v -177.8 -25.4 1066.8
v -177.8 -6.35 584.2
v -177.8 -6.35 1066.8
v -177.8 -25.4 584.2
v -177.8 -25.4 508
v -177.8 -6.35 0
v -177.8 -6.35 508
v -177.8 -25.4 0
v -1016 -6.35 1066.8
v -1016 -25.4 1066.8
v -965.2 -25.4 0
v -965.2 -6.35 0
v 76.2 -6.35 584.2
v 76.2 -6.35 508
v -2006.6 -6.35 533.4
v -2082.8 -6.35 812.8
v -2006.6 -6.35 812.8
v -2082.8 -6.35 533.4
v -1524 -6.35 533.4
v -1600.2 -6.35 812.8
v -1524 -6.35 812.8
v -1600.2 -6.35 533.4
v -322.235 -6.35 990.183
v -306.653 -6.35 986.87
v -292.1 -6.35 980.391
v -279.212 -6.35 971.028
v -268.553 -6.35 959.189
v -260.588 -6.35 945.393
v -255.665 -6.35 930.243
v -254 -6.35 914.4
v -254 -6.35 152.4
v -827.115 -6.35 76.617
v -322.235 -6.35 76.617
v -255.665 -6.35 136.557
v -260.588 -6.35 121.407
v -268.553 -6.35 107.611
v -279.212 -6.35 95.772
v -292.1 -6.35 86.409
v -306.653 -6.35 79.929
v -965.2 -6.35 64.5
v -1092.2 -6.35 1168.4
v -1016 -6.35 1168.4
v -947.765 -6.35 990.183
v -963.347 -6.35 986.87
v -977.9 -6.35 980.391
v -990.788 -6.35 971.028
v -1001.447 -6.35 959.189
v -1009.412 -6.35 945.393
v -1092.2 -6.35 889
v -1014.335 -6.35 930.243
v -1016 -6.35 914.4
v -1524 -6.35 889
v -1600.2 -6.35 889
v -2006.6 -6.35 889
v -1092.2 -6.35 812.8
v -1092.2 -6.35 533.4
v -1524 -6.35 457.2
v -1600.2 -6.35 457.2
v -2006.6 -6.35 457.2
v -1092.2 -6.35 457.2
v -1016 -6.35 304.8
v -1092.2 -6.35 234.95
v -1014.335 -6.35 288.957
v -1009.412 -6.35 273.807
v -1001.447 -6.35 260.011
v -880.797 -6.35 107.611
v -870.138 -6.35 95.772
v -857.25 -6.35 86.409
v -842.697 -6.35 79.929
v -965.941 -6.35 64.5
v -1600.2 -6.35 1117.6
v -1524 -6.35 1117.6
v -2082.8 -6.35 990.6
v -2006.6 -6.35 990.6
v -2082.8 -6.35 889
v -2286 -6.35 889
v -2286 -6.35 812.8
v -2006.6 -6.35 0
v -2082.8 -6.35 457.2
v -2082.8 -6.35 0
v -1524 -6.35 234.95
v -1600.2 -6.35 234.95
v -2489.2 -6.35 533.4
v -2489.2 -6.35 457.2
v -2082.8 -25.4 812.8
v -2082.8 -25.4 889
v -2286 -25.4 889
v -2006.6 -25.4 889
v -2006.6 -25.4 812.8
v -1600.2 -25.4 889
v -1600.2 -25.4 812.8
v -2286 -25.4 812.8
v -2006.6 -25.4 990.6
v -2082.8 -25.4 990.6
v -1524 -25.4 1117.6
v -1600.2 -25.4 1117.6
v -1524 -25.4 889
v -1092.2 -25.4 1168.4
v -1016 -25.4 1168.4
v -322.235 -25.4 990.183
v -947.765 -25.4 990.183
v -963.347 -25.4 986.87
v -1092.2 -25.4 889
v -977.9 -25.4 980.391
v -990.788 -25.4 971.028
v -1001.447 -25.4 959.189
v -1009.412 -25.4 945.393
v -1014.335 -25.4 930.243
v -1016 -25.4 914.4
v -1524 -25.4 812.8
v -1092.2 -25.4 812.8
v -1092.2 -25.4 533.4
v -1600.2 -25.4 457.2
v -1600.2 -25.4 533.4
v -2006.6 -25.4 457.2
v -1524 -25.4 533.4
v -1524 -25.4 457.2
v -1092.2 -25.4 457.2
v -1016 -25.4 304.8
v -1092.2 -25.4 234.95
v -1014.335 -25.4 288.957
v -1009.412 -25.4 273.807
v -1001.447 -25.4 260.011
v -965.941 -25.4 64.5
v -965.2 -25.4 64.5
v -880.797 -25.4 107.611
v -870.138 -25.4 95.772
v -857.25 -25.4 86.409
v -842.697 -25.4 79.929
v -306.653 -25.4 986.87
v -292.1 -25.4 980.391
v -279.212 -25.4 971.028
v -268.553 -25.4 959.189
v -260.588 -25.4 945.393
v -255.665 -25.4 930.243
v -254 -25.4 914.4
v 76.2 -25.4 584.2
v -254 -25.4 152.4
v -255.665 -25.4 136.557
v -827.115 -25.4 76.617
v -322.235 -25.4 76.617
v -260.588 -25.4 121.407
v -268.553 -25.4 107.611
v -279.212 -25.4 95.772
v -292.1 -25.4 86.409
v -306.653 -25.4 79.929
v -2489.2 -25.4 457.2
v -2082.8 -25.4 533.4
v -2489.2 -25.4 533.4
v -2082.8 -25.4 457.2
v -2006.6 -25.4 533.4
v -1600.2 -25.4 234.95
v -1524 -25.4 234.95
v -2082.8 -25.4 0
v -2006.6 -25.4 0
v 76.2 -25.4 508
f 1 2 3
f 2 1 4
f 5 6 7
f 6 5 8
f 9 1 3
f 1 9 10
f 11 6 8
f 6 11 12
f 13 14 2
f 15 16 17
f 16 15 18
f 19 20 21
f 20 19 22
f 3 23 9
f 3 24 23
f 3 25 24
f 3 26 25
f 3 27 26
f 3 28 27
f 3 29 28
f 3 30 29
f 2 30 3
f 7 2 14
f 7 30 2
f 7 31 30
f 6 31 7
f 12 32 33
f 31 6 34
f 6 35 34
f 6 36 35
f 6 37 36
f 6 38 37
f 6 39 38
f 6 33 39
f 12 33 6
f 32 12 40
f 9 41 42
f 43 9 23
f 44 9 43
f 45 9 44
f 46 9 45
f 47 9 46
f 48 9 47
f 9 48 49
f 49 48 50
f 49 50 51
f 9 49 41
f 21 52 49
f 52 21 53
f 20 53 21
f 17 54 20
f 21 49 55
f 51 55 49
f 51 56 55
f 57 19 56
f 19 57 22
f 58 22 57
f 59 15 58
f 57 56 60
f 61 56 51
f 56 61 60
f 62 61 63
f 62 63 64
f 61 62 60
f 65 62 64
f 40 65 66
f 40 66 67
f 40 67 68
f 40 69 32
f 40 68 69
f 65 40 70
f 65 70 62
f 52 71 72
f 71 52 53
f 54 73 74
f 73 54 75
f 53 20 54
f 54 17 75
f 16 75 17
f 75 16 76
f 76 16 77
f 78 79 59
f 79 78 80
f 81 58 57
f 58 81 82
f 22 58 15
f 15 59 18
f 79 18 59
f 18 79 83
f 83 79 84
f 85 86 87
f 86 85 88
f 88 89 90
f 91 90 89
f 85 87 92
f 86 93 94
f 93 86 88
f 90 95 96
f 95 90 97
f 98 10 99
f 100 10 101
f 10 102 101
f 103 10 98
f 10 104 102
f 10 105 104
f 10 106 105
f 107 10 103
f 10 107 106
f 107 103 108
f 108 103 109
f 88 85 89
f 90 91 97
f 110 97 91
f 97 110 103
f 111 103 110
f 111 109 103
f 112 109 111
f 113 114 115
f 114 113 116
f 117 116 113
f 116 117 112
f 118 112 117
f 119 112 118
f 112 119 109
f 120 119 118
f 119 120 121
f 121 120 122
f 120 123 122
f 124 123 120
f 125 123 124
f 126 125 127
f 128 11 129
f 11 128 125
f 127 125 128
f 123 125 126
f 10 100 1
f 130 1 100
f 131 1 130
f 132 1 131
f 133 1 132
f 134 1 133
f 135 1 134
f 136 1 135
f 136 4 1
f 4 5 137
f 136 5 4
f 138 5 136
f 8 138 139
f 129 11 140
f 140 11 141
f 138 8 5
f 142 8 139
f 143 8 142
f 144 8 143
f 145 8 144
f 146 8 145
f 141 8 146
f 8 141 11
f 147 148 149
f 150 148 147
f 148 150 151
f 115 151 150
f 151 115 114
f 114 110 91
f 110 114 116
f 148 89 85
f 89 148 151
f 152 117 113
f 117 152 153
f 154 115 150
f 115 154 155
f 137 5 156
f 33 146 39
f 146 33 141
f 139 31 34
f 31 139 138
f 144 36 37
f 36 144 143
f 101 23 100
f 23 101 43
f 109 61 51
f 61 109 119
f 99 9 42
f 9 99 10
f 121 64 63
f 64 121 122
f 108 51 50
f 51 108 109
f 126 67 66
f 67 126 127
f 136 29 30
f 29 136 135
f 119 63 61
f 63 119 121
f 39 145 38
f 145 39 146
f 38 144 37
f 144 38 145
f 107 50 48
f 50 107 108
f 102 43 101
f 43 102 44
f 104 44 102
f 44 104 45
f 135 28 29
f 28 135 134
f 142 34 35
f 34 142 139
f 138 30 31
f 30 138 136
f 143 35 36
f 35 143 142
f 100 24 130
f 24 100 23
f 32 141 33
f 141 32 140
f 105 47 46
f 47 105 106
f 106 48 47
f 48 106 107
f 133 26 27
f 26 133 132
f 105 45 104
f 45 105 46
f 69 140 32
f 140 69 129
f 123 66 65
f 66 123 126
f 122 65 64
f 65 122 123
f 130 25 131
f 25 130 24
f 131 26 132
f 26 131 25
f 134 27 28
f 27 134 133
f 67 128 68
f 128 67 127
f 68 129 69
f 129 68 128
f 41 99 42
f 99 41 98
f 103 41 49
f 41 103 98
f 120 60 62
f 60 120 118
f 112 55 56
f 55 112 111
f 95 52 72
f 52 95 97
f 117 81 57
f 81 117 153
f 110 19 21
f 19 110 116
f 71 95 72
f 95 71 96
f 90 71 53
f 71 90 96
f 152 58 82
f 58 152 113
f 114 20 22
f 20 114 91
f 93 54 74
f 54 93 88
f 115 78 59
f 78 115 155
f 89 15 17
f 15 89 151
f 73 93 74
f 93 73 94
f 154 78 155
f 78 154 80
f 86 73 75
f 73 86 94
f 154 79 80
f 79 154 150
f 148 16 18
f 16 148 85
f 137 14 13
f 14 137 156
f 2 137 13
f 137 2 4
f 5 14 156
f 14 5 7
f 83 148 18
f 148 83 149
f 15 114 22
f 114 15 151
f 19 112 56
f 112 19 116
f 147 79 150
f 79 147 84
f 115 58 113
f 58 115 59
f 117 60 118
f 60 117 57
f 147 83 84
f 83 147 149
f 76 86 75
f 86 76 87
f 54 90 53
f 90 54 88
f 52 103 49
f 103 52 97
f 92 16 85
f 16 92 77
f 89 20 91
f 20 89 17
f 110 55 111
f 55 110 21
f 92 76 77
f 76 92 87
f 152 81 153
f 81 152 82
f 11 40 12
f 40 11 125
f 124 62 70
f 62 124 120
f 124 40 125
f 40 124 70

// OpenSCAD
// file: ../constants/trailer.scad
use <../lib/convert.scad>

FRAME_WIDTH = feet(4);
FRAME_LENGTH = feet(8);
FRAME_THICKNESS = inches(3);
AXEL_OFFSET_Y = inches(6);
// file: teardrop_ceiling.scad
use <../lib/convert.scad>

/**
 * TODO:
 * - Make lip over walls
 * - Cutout for stargazer window
 * - Cutout for fan
 * - Make galley door
 */

ceiling_width = feet(5);
ceiling_thickness = inches(1.75);

// Fixes for dxf import
bottom_offset = inches(-0.67);
front_offset = feet(-8) + inches(-11.07);
scale_fix = 1.002;

module teardrop_ceiling_half() {
  cutout_scale = (feet(4) - ceiling_thickness) / feet(4);
  difference() {
    // side shape from dxf
    translate([front_offset, 0, bottom_offset])
    rotate([90, 0, 0])
    linear_extrude(height = ceiling_width / 2)
    scale([scale_fix, scale_fix])
        import("../../drawings/sidewall.dxf");

    // cut out inside
    translate([-ceiling_thickness, 1, -1])
    scale([cutout_scale, 1.1, cutout_scale])
    translate([front_offset, 0, bottom_offset])
    rotate([90, 0, 0])
    linear_extrude(height = ceiling_width / 2)
    scale([scale_fix, scale_fix])
        import("../../drawings/sidewall.dxf");
  }
}

module teardrop_ceiling_galley_cutout() {
  translate([feet(-8) + inches(-12), -(ceiling_width / 2) - 1, inches(-3)])
    cube([inches(30), ceiling_width + 2, feet(4)]);
}

module teardrop_ceiling() {
  difference() {
    union() {
      mirror([0, 1, 0])
        teardrop_ceiling_half();
      teardrop_ceiling_half();
    }

    // cut out galley
    teardrop_ceiling_galley_cutout();
  }
}

teardrop_ceiling();
// file: wheel_well.scad
use <../lib/convert.scad>
use <../lib/colors.scad>

wheel_well_top_width = inches(22);
wheel_well_base_width = inches(32);
wheel_well_depth = inches(13);
wheel_well_base_thickness = inches(2.5);
wheel_well_height = inches(6) + wheel_well_base_thickness;


module wheel_well_cutout() {
  translate([0, 0, -1])
  translate([0, wheel_well_base_width / -2, 0])
  cube([wheel_well_depth + 1, wheel_well_base_width, wheel_well_base_thickness + 2]);
}

module wheel_well_shape() {
  color_wood()
  translate([0, wheel_well_base_width / -2, 0])
  hull() {
    translate([0, (wheel_well_base_width - wheel_well_top_width) / 2, wheel_well_height])
      cube([wheel_well_depth, wheel_well_top_width, inches(0.75)]);

    cube([wheel_well_depth, wheel_well_base_width, wheel_well_base_thickness]);
  }
}

module wheel_well_inside() {
  scale_y = (wheel_well_base_width - inches(1.5)) / wheel_well_base_width;
  scale_z = (wheel_well_height - inches(0.75)) / wheel_well_height;

  color_black()
  scale([1, scale_y, scale_z])
    wheel_well_shape();
}

module wheel_well() {
  difference() {
    wheel_well_shape();

    translate([inches(0.75), 0, -1])
      wheel_well_inside();
  }
}

wheel_well();
// file: ../lib/colors.scad
module color_wood() {
  color("#F8D89D")
    children();
}

module color_hdpe() {
  color("#ccd")
    children();
}

module color_steel() {
  color("#888")
    children();
}

module color_white() {
  color("#fafafa")
    children();
}

module color_black() {
  color("#333")
    children();
}

module color_outside() {
  color("#90b0c4")
    children();
}
// file: ../lib/convert.scad
function inches(in) = in * 25.4;
function feet(ft) = inches(ft * 12);
// main file
use <../lib/convert.scad>
use <../lib/colors.scad>
use <./wheel_well.scad>
use <./teardrop_ceiling.scad>
include <../constants/trailer.scad>

side_skin_thickness = inches(0.25);
side_frame_thickness = inches(0.75);

wheel_well_x_offset = AXEL_OFFSET_Y + feet(4) + inches(0);

door_width = inches(30);
door_height = inches(36);
door_radius = inches(3);
door_offset = inches(10);

// Fixes for dxf import
bottom_offset = inches(-0.67);
front_offset = feet(-8) + inches(-11.07);
scale_fix = 1.002;

module door_cutout() {
  thickness = inches(3);
  radius_offset = door_radius * 2;

  translate([door_radius, door_radius, -thickness / 2])
  hull() {
    // bottom left, this creates a angled corner to fit the wheelwell
    translate([0, inches(6), 0])
      cylinder(thickness, r1 = door_radius, r2 = door_radius);
    translate([inches(4.75), 0, 0])
      cylinder(thickness, r1 = door_radius, r2 = door_radius);

    // bottom right
    translate([door_width - radius_offset, 0, 0])
      cylinder(thickness, r1 = door_radius, r2 = door_radius);

    // top left
    translate([0, door_height -  radius_offset, 0])
      cylinder(thickness, r1 = door_radius, r2 = door_radius);

    // top right
    translate([door_width -  radius_offset, door_height -  radius_offset, 0])
      cylinder(thickness, r1 = door_radius, r2 = door_radius);
  }
}

module side_extrusion(thickness) {
  translate([front_offset, 0, bottom_offset])
  rotate([90, 0, 0])
  linear_extrude(height = thickness)
  scale([scale_fix, scale_fix])
      import("../../drawings/sidewall.dxf");
}

module outside_side_skin() {
  color_outside()
  difference() {
    side_extrusion(side_skin_thickness);

    // door cut out
    translate([-door_width - door_offset, 0, inches(3)])
    rotate([90, 0, 0])
      door_cutout();

    translate([-wheel_well_x_offset, inches(-3), 0])
    rotate([0, 0, 90])
      wheel_well_shape();

    translate([-wheel_well_x_offset, inches(-3), 0])
    rotate([0, 0, 90])
      wheel_well_cutout();
  }
}

module inside_side_skin() {
  color_wood()
  difference() {
    outside_side_skin();

    // inside 1/4" ply doesnt extend all the way down
    translate([feet(-9), inches(-0.5), inches(-0.5)])
      cube([feet(10), inches(0.75), inches(3)]);

    // Cut out the ceiling
    translate([10, 1, -1])
    scale([1.01, 1, 1.01])
    teardrop_ceiling_half();
  }
}

module side_frame() {
  color_wood()
  difference() {
    union() {
      // outer frame
      difference() {
        side_extrusion(side_frame_thickness);

        translate([inches(-3), inches(0.25), inches(3)])
          scale([0.93, 1, 0.88])
          side_extrusion(side_frame_thickness * 2);

      }

      // door frame
      difference() {
        translate([inches(-32) - door_offset, inches(-0.75), 0])
          cube([inches(35), inches(0.75), inches(42)]);

        translate([-door_width - door_offset, 0, inches(3)])
        rotate([90, 0, 0])
          door_cutout();
      }

      // door virt
      translate([-door_width - door_offset - inches(3), inches(-0.75), 0])
        cube([inches(3), inches(0.75), inches(46)]);

      // first virt
      translate([feet(-5.25), inches(-0.75), 0])
        cube([inches(3), inches(0.75), inches(44)]);

      // second virt
      translate([feet(-6) + inches(-10), inches(-0.75), 0])
        cube([inches(3), inches(0.75), inches(39)]);

      // front horz
      translate([-door_offset + inches(3), inches(-0.75), inches(20)])
        cube([door_offset, inches(0.75), inches(3)]);

      // back lower
      translate([feet(-8) + inches(-2), inches(-0.75), inches(18)])
        cube([feet(4.75), inches(0.75), inches(3)]);

      // back upper
      translate([feet(-7.5), inches(-0.75), inches(32)])
        cube([feet(4), inches(0.75), inches(3)]);
    }

    translate([-wheel_well_x_offset, inches(-3), 0])
    rotate([0, 0, 90])
      wheel_well_shape();

    translate([-wheel_well_x_offset, inches(-3), 0])
    rotate([0, 0, 90])
      wheel_well_cutout();
  }
}


module teardrop_side() {
  union() {
    translate([0, -(side_skin_thickness + side_frame_thickness), 0])
      outside_side_skin();

    translate([0, -side_skin_thickness, 0])
      side_frame();

    inside_side_skin();
  }
}

teardrop_side();
